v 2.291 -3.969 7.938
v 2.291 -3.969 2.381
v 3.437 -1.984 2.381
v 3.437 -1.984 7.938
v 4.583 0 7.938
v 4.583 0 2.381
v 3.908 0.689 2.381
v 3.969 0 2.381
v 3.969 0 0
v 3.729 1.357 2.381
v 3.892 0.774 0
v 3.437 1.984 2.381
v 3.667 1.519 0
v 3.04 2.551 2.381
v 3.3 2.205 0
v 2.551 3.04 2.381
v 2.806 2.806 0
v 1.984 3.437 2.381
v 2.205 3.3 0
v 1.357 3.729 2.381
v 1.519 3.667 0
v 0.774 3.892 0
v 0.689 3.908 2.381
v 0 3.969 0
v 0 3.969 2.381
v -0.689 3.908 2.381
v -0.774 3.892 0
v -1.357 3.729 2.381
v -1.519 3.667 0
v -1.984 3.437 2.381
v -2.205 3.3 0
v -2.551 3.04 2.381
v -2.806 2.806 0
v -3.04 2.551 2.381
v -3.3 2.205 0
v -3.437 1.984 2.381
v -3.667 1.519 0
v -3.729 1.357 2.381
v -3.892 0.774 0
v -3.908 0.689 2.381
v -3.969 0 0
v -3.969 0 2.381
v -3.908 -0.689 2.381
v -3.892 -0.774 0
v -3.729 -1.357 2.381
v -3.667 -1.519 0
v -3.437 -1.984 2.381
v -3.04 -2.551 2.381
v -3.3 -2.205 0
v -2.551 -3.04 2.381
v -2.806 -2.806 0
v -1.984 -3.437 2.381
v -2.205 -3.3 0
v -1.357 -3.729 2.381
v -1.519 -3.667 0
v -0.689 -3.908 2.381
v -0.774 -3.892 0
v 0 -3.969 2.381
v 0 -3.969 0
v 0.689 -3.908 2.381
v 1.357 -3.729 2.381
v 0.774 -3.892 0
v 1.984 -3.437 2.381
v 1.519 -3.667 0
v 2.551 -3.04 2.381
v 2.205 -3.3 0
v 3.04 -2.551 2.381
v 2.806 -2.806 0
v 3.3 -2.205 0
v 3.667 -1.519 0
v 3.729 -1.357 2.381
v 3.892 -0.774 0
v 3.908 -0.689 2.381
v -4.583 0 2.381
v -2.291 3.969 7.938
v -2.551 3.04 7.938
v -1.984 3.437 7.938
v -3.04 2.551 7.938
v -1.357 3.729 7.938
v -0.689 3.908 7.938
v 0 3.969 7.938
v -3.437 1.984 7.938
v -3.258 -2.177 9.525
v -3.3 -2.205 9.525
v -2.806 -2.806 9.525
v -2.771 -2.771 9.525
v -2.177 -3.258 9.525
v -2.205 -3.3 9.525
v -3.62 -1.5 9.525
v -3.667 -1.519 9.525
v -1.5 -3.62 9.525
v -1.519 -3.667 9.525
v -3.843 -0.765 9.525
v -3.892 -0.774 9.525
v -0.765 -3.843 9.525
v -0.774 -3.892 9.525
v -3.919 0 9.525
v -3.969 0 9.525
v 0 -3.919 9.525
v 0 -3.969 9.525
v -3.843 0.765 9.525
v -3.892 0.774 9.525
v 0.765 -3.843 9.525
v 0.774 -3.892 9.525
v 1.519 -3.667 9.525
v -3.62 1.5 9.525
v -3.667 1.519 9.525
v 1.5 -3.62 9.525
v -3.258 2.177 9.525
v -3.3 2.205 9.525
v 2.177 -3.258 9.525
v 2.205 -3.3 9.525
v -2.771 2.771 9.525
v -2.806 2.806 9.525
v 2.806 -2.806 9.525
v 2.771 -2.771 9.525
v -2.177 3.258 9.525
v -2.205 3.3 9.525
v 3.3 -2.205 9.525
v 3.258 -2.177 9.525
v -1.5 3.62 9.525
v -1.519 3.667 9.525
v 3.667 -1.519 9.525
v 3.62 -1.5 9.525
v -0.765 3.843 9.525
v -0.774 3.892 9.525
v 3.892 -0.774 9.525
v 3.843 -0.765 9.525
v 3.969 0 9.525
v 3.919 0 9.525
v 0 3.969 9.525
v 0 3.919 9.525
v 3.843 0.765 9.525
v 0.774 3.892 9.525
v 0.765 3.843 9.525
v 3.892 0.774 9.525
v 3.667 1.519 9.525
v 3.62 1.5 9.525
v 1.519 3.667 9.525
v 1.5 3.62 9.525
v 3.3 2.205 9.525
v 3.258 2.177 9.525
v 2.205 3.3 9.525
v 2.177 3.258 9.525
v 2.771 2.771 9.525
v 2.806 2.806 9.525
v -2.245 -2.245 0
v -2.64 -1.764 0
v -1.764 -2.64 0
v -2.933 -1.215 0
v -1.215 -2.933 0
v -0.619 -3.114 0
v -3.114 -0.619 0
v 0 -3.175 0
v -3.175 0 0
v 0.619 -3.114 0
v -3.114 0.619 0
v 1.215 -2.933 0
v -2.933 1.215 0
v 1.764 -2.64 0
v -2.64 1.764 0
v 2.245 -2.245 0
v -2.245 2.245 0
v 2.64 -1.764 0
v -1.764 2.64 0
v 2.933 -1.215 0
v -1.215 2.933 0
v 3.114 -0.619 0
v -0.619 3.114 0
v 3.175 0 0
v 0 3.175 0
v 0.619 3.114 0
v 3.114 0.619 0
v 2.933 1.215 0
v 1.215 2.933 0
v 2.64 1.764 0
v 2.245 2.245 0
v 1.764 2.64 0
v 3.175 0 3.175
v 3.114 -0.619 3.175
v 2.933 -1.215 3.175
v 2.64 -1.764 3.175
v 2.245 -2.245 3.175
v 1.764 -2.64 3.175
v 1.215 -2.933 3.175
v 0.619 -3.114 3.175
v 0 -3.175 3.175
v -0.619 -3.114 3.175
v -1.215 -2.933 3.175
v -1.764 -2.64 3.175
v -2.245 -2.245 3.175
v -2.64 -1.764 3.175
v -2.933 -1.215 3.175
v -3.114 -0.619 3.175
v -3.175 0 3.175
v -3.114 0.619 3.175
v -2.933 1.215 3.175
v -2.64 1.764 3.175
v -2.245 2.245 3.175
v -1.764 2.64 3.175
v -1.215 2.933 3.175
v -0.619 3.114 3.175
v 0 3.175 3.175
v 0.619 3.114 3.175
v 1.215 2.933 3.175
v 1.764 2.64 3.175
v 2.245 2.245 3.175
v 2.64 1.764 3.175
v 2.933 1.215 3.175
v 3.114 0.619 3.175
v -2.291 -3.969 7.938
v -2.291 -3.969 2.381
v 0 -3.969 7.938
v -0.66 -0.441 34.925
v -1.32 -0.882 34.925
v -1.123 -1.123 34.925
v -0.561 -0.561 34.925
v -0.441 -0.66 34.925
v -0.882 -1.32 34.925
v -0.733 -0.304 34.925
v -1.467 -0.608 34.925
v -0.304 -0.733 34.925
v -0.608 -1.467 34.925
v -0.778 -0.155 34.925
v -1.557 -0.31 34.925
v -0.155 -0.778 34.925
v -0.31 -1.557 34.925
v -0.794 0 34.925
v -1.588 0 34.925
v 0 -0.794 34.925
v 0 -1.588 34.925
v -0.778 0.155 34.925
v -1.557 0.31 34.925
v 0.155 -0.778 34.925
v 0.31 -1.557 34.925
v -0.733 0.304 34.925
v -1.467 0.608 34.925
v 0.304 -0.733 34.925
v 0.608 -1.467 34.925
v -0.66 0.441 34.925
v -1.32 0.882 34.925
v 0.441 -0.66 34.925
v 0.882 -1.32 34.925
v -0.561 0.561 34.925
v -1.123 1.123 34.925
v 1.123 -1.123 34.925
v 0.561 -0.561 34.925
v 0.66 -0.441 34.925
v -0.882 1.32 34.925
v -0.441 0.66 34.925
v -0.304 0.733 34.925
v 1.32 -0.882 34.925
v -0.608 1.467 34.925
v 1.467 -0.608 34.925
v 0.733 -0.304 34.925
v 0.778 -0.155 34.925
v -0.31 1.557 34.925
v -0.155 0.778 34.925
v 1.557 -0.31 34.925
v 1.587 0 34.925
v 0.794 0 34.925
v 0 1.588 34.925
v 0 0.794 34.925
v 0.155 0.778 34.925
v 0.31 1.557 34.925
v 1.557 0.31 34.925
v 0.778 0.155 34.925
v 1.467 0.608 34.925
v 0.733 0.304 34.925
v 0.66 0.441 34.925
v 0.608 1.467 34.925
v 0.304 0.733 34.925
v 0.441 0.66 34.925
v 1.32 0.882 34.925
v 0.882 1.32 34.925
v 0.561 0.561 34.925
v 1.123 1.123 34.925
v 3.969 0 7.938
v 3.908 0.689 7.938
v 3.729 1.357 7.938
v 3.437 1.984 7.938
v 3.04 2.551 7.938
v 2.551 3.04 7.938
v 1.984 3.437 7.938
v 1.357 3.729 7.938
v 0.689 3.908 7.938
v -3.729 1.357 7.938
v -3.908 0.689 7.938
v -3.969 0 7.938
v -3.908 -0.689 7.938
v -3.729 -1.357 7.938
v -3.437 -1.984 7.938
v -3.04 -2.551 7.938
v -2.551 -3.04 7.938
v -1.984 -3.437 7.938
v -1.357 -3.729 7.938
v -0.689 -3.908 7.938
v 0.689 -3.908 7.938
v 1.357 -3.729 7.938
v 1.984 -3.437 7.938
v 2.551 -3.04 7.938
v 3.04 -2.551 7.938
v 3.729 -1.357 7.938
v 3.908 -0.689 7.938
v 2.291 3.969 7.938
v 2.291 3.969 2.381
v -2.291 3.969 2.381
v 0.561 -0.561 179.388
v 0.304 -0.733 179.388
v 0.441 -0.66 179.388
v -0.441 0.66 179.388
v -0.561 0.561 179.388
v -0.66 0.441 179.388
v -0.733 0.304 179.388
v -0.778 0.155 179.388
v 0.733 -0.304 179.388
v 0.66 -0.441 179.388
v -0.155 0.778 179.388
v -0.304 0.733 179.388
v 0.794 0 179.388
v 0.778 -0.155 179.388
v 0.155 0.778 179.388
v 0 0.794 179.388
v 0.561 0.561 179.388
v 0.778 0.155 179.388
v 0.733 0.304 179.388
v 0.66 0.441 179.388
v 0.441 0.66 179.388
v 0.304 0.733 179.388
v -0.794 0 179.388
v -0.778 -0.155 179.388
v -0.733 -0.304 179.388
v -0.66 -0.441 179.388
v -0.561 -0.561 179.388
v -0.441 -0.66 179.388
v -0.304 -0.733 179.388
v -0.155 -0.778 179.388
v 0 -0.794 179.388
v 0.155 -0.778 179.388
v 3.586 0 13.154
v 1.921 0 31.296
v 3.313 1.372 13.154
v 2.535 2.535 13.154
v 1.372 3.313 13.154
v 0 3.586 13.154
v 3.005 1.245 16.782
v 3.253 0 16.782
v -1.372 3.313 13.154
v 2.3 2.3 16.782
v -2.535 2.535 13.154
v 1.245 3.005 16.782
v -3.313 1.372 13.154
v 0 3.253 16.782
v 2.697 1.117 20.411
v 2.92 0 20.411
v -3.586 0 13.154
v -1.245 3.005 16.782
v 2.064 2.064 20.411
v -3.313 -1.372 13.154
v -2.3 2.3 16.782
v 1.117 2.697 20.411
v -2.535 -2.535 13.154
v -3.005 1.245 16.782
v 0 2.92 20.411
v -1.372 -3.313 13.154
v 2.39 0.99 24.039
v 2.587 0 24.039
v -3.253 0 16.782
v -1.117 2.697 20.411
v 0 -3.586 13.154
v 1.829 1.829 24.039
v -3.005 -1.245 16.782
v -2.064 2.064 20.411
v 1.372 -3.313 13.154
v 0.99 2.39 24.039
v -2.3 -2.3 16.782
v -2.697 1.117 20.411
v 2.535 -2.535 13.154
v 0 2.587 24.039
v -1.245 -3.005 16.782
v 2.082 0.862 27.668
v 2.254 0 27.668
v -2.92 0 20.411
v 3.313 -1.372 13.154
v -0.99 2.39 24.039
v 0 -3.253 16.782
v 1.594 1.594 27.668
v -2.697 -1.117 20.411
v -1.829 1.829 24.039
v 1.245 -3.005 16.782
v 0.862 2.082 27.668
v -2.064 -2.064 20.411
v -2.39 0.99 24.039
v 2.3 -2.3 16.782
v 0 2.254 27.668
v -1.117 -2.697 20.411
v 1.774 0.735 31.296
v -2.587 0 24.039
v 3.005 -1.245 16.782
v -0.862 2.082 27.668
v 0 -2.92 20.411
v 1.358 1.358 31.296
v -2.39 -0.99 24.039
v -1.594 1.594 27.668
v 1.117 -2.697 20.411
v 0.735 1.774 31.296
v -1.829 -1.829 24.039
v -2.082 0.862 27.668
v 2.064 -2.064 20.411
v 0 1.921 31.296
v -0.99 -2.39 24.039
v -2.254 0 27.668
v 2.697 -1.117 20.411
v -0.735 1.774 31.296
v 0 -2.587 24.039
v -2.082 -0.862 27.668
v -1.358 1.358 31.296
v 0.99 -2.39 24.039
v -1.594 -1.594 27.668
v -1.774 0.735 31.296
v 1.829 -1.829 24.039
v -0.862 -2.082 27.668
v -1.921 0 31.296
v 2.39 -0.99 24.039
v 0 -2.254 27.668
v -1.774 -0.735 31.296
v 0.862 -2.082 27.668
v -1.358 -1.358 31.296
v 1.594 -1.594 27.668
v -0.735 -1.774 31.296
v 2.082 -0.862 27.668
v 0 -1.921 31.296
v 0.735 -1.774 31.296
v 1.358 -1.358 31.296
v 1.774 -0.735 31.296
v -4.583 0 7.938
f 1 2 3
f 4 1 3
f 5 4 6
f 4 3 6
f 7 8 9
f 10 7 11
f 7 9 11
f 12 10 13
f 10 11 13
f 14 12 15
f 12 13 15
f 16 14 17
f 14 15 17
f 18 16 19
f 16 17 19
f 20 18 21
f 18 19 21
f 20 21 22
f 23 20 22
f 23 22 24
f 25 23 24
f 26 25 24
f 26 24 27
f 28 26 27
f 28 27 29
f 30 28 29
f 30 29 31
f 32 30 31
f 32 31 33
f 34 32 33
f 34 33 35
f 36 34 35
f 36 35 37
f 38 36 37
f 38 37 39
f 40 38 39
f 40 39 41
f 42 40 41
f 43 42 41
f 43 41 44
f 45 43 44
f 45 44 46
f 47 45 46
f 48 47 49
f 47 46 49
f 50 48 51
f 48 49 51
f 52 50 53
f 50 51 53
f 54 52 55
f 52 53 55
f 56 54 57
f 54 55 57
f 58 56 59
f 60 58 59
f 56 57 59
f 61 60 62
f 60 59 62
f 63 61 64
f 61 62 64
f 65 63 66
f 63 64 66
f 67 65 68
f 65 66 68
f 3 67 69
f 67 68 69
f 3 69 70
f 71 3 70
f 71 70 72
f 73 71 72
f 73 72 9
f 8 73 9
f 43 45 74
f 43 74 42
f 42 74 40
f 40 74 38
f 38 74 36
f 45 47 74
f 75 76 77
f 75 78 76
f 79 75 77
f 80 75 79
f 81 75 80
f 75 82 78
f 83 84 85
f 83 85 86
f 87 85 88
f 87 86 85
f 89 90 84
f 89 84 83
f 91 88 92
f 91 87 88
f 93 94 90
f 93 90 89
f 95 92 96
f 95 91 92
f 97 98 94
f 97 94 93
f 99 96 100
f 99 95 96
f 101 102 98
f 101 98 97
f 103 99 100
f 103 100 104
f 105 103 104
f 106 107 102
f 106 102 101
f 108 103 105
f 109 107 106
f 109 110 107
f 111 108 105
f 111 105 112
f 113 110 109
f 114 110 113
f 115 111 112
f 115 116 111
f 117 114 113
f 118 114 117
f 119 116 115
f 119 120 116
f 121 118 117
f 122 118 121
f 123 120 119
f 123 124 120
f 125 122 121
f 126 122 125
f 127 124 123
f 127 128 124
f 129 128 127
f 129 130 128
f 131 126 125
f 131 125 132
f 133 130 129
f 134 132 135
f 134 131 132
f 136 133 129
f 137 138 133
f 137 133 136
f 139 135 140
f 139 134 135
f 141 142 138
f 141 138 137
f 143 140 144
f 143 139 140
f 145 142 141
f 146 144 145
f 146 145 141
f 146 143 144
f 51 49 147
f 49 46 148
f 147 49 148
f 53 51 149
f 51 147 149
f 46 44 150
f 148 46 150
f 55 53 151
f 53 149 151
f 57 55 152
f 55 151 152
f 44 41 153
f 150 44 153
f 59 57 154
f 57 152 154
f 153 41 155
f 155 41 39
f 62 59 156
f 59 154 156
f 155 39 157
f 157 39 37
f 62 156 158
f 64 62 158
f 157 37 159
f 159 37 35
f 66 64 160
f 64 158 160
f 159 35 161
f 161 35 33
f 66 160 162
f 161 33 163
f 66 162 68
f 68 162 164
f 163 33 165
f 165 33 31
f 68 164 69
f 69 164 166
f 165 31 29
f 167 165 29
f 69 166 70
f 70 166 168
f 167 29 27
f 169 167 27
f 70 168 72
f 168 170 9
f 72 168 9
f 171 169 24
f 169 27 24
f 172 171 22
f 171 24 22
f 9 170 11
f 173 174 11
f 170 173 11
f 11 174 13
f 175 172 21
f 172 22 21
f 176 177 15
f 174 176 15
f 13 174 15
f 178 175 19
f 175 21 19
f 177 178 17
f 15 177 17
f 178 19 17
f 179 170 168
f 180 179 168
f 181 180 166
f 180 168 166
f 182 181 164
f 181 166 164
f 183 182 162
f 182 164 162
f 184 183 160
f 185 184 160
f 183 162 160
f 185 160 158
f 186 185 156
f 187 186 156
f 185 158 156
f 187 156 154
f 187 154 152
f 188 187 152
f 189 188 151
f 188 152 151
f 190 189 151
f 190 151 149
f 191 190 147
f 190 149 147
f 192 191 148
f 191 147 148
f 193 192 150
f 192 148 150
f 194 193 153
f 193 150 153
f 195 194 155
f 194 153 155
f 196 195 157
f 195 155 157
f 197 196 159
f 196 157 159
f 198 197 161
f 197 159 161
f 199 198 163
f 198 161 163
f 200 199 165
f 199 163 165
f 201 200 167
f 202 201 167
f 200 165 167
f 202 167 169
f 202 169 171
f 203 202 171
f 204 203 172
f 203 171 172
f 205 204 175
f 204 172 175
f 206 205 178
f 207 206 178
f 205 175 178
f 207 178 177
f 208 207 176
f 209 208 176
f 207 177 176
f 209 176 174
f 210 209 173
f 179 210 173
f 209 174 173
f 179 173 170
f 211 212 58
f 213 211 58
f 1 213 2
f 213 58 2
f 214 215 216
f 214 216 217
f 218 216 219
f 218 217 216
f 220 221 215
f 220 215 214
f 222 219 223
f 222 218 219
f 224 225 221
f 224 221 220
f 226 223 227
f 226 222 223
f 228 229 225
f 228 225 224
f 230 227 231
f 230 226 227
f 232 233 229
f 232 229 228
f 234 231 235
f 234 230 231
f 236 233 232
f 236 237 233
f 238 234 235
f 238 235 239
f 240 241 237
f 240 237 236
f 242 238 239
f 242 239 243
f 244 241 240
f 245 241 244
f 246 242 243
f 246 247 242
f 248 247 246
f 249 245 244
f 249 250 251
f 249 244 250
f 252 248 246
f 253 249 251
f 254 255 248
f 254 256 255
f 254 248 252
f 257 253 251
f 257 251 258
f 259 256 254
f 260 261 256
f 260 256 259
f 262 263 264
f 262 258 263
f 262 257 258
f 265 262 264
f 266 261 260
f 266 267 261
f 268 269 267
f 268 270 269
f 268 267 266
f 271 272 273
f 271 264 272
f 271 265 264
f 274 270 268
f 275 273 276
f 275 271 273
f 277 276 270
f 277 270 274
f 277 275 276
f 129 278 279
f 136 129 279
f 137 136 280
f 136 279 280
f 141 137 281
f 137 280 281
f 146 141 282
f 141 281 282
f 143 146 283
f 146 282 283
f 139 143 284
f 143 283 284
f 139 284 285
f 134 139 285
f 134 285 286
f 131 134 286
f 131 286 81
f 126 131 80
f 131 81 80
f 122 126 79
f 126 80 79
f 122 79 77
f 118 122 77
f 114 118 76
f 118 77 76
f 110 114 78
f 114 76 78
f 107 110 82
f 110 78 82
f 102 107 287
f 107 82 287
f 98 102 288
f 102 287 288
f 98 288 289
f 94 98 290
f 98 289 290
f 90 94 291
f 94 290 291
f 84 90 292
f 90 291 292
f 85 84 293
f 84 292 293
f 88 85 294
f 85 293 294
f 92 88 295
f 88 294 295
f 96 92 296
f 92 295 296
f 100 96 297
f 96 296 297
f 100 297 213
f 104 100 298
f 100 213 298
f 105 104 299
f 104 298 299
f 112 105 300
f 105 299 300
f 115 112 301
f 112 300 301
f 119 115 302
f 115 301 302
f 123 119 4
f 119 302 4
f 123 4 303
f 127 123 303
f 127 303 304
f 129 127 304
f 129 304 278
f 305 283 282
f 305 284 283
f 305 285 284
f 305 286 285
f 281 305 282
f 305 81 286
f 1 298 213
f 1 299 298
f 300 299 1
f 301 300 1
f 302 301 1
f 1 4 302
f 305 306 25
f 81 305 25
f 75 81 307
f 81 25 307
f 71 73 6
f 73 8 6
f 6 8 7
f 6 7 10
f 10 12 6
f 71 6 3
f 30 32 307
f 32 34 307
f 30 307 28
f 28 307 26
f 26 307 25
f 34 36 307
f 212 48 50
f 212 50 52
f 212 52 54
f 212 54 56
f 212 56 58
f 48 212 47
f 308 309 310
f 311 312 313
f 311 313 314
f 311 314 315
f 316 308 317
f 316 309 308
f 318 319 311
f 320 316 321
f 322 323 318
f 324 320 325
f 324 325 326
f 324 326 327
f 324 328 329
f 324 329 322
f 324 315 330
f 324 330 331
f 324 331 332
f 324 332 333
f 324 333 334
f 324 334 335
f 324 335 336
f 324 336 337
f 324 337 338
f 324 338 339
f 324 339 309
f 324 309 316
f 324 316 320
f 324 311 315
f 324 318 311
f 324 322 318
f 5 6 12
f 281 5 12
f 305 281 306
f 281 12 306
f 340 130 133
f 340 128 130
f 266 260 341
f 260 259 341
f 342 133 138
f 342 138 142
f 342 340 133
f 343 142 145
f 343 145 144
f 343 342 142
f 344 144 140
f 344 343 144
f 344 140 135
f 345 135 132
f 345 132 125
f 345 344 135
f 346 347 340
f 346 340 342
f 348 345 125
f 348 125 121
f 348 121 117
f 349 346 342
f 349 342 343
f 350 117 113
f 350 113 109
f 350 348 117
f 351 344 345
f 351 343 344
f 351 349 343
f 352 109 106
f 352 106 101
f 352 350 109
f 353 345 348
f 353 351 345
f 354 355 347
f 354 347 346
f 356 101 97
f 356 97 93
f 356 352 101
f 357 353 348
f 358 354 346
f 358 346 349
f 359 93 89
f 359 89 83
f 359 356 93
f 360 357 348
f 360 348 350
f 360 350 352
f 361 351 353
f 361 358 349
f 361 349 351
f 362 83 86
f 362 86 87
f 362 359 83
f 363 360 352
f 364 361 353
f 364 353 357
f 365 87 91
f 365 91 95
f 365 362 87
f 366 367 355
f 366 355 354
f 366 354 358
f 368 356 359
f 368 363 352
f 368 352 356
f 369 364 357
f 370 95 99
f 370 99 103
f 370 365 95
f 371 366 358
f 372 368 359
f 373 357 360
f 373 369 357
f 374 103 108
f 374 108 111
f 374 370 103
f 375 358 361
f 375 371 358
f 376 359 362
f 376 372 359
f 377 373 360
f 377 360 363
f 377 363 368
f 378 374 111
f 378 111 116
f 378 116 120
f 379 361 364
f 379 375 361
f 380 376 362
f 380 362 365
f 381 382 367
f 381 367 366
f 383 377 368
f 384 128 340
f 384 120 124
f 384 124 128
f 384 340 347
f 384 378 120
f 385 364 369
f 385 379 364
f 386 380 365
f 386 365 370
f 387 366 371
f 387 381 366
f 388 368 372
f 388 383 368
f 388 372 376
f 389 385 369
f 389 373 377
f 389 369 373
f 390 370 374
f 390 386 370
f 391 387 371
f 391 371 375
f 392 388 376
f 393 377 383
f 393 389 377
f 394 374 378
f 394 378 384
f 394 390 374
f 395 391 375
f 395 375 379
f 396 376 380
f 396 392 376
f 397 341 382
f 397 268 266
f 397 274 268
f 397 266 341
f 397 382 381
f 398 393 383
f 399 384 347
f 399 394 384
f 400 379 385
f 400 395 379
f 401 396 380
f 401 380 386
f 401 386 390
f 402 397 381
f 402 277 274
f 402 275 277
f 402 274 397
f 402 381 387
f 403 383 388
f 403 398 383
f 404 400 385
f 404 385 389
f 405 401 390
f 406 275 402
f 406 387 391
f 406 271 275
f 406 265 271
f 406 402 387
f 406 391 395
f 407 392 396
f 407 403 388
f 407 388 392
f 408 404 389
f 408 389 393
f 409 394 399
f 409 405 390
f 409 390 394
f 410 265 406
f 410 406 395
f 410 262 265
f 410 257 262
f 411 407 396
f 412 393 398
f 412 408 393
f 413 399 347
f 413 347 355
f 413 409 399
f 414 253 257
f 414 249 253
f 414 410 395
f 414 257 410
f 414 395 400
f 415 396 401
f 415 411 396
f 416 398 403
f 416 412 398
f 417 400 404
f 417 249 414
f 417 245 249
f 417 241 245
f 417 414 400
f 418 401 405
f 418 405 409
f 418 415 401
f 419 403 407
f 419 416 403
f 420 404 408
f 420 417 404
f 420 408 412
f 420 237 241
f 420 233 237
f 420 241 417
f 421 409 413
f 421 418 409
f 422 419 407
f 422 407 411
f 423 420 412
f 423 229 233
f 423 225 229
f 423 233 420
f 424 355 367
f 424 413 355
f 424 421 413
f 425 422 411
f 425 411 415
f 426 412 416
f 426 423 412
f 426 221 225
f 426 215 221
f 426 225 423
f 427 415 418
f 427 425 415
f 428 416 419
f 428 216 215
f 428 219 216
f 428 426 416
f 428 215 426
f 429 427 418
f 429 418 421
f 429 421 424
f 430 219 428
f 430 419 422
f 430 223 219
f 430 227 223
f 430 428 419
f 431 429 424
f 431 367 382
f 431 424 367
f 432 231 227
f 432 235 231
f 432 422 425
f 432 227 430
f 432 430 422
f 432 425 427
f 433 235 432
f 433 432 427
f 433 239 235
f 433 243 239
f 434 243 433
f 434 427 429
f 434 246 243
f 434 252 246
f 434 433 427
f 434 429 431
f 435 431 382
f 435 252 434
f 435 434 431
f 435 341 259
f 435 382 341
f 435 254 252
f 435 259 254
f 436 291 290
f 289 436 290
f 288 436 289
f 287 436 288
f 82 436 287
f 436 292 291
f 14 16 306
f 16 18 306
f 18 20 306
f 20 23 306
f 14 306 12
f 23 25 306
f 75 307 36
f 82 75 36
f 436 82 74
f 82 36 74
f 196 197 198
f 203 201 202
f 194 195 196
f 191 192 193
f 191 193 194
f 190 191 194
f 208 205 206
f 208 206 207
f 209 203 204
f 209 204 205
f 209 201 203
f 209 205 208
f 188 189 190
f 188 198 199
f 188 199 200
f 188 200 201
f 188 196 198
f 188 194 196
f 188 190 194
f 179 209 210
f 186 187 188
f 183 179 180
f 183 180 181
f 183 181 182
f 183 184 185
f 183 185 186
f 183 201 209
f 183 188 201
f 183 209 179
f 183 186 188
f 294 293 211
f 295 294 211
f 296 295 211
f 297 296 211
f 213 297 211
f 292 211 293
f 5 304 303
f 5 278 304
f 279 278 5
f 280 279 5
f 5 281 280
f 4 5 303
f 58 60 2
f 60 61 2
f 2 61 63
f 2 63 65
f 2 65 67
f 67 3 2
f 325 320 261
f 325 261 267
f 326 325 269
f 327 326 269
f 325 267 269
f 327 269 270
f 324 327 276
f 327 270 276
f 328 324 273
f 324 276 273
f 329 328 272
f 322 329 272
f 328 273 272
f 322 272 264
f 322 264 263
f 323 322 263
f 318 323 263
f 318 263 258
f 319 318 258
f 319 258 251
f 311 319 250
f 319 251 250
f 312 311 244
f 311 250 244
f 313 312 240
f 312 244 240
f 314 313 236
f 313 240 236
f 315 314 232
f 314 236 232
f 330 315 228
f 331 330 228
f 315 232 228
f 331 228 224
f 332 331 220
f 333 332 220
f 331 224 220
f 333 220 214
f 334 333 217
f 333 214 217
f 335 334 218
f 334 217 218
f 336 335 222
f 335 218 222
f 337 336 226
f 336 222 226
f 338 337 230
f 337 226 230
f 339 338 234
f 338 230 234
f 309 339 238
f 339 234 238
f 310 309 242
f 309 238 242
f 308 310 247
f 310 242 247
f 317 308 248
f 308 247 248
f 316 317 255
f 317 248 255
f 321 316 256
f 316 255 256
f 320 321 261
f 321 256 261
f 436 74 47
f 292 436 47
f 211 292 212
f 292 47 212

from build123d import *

# Parameters (mm, degrees)
F0_R      = 3.96875
F1_DEPTH  = 2.38125
F3_DEPTH  = 5.55625
F4_R      = 3.96875
F5_DEPTH  = 1.5875
F6_R      = 3.175
F7_DEPTH  = 3.175
F8_R      = 1.5875
F9_DEPTH  = 25.4
F12_R     = 0.79375
F13_DEPTH = 144.4625


# Not quite as in the source:
# - a length typed as a fraction of an inch, garbled in the dataset ("3 / 203.2 mm" for 3/8 in), is restored


with BuildPart() as f1:
    # F0 (on Top) → F1 (new body)
    with BuildSketch(Plane.XY):
        Circle(F0_R)
    extrude(amount=F1_DEPTH)

    # F2 (on face) → F3 (join)
    with BuildSketch(Plane.XY.offset(2.38125)):
        Polygon((2.2913588808, 3.96875), (-2.2913588808, 3.96875), (-4.5827177617, 0), (-2.2913588808, -3.96875), (2.2913588808, -3.96875), (4.5827177617, 0), align=None)
    extrude(amount=F3_DEPTH)

    # F4 (on face) → F5 (join)
    with BuildSketch(Plane.XY.offset(7.9375)):
        Circle(F4_R)
    extrude(amount=F5_DEPTH)

    # F6 (on face) → F7 (cut)
    with BuildSketch(Plane(origin=(0, 0, 0), x_dir=(1, 0, 0), z_dir=(0, 0, -1))):
        Circle(F6_R)
    extrude(amount=-F7_DEPTH, mode=Mode.SUBTRACT)

    # F8 (on face) → F9 (join)
    with BuildSketch(Plane.XY.offset(9.525)):
        Circle(F8_R)
    extrude(amount=F9_DEPTH)

    # F10 (on Front) → F11 (revolve)
    with BuildSketch(Plane.XZ):
        Polygon((1.5875, 34.925), (0, 34.925), (0, 9.525), (3.9187353296, 9.525), align=None)
    revolve(axis=Axis((0, 0, 9.525), (0, 0, 1)))

    # F12 (on face) → F13 (join)
    with BuildSketch(Plane.XY.offset(34.925)):
        Circle(F12_R)
    extrude(amount=F13_DEPTH)


solid = f1.part
